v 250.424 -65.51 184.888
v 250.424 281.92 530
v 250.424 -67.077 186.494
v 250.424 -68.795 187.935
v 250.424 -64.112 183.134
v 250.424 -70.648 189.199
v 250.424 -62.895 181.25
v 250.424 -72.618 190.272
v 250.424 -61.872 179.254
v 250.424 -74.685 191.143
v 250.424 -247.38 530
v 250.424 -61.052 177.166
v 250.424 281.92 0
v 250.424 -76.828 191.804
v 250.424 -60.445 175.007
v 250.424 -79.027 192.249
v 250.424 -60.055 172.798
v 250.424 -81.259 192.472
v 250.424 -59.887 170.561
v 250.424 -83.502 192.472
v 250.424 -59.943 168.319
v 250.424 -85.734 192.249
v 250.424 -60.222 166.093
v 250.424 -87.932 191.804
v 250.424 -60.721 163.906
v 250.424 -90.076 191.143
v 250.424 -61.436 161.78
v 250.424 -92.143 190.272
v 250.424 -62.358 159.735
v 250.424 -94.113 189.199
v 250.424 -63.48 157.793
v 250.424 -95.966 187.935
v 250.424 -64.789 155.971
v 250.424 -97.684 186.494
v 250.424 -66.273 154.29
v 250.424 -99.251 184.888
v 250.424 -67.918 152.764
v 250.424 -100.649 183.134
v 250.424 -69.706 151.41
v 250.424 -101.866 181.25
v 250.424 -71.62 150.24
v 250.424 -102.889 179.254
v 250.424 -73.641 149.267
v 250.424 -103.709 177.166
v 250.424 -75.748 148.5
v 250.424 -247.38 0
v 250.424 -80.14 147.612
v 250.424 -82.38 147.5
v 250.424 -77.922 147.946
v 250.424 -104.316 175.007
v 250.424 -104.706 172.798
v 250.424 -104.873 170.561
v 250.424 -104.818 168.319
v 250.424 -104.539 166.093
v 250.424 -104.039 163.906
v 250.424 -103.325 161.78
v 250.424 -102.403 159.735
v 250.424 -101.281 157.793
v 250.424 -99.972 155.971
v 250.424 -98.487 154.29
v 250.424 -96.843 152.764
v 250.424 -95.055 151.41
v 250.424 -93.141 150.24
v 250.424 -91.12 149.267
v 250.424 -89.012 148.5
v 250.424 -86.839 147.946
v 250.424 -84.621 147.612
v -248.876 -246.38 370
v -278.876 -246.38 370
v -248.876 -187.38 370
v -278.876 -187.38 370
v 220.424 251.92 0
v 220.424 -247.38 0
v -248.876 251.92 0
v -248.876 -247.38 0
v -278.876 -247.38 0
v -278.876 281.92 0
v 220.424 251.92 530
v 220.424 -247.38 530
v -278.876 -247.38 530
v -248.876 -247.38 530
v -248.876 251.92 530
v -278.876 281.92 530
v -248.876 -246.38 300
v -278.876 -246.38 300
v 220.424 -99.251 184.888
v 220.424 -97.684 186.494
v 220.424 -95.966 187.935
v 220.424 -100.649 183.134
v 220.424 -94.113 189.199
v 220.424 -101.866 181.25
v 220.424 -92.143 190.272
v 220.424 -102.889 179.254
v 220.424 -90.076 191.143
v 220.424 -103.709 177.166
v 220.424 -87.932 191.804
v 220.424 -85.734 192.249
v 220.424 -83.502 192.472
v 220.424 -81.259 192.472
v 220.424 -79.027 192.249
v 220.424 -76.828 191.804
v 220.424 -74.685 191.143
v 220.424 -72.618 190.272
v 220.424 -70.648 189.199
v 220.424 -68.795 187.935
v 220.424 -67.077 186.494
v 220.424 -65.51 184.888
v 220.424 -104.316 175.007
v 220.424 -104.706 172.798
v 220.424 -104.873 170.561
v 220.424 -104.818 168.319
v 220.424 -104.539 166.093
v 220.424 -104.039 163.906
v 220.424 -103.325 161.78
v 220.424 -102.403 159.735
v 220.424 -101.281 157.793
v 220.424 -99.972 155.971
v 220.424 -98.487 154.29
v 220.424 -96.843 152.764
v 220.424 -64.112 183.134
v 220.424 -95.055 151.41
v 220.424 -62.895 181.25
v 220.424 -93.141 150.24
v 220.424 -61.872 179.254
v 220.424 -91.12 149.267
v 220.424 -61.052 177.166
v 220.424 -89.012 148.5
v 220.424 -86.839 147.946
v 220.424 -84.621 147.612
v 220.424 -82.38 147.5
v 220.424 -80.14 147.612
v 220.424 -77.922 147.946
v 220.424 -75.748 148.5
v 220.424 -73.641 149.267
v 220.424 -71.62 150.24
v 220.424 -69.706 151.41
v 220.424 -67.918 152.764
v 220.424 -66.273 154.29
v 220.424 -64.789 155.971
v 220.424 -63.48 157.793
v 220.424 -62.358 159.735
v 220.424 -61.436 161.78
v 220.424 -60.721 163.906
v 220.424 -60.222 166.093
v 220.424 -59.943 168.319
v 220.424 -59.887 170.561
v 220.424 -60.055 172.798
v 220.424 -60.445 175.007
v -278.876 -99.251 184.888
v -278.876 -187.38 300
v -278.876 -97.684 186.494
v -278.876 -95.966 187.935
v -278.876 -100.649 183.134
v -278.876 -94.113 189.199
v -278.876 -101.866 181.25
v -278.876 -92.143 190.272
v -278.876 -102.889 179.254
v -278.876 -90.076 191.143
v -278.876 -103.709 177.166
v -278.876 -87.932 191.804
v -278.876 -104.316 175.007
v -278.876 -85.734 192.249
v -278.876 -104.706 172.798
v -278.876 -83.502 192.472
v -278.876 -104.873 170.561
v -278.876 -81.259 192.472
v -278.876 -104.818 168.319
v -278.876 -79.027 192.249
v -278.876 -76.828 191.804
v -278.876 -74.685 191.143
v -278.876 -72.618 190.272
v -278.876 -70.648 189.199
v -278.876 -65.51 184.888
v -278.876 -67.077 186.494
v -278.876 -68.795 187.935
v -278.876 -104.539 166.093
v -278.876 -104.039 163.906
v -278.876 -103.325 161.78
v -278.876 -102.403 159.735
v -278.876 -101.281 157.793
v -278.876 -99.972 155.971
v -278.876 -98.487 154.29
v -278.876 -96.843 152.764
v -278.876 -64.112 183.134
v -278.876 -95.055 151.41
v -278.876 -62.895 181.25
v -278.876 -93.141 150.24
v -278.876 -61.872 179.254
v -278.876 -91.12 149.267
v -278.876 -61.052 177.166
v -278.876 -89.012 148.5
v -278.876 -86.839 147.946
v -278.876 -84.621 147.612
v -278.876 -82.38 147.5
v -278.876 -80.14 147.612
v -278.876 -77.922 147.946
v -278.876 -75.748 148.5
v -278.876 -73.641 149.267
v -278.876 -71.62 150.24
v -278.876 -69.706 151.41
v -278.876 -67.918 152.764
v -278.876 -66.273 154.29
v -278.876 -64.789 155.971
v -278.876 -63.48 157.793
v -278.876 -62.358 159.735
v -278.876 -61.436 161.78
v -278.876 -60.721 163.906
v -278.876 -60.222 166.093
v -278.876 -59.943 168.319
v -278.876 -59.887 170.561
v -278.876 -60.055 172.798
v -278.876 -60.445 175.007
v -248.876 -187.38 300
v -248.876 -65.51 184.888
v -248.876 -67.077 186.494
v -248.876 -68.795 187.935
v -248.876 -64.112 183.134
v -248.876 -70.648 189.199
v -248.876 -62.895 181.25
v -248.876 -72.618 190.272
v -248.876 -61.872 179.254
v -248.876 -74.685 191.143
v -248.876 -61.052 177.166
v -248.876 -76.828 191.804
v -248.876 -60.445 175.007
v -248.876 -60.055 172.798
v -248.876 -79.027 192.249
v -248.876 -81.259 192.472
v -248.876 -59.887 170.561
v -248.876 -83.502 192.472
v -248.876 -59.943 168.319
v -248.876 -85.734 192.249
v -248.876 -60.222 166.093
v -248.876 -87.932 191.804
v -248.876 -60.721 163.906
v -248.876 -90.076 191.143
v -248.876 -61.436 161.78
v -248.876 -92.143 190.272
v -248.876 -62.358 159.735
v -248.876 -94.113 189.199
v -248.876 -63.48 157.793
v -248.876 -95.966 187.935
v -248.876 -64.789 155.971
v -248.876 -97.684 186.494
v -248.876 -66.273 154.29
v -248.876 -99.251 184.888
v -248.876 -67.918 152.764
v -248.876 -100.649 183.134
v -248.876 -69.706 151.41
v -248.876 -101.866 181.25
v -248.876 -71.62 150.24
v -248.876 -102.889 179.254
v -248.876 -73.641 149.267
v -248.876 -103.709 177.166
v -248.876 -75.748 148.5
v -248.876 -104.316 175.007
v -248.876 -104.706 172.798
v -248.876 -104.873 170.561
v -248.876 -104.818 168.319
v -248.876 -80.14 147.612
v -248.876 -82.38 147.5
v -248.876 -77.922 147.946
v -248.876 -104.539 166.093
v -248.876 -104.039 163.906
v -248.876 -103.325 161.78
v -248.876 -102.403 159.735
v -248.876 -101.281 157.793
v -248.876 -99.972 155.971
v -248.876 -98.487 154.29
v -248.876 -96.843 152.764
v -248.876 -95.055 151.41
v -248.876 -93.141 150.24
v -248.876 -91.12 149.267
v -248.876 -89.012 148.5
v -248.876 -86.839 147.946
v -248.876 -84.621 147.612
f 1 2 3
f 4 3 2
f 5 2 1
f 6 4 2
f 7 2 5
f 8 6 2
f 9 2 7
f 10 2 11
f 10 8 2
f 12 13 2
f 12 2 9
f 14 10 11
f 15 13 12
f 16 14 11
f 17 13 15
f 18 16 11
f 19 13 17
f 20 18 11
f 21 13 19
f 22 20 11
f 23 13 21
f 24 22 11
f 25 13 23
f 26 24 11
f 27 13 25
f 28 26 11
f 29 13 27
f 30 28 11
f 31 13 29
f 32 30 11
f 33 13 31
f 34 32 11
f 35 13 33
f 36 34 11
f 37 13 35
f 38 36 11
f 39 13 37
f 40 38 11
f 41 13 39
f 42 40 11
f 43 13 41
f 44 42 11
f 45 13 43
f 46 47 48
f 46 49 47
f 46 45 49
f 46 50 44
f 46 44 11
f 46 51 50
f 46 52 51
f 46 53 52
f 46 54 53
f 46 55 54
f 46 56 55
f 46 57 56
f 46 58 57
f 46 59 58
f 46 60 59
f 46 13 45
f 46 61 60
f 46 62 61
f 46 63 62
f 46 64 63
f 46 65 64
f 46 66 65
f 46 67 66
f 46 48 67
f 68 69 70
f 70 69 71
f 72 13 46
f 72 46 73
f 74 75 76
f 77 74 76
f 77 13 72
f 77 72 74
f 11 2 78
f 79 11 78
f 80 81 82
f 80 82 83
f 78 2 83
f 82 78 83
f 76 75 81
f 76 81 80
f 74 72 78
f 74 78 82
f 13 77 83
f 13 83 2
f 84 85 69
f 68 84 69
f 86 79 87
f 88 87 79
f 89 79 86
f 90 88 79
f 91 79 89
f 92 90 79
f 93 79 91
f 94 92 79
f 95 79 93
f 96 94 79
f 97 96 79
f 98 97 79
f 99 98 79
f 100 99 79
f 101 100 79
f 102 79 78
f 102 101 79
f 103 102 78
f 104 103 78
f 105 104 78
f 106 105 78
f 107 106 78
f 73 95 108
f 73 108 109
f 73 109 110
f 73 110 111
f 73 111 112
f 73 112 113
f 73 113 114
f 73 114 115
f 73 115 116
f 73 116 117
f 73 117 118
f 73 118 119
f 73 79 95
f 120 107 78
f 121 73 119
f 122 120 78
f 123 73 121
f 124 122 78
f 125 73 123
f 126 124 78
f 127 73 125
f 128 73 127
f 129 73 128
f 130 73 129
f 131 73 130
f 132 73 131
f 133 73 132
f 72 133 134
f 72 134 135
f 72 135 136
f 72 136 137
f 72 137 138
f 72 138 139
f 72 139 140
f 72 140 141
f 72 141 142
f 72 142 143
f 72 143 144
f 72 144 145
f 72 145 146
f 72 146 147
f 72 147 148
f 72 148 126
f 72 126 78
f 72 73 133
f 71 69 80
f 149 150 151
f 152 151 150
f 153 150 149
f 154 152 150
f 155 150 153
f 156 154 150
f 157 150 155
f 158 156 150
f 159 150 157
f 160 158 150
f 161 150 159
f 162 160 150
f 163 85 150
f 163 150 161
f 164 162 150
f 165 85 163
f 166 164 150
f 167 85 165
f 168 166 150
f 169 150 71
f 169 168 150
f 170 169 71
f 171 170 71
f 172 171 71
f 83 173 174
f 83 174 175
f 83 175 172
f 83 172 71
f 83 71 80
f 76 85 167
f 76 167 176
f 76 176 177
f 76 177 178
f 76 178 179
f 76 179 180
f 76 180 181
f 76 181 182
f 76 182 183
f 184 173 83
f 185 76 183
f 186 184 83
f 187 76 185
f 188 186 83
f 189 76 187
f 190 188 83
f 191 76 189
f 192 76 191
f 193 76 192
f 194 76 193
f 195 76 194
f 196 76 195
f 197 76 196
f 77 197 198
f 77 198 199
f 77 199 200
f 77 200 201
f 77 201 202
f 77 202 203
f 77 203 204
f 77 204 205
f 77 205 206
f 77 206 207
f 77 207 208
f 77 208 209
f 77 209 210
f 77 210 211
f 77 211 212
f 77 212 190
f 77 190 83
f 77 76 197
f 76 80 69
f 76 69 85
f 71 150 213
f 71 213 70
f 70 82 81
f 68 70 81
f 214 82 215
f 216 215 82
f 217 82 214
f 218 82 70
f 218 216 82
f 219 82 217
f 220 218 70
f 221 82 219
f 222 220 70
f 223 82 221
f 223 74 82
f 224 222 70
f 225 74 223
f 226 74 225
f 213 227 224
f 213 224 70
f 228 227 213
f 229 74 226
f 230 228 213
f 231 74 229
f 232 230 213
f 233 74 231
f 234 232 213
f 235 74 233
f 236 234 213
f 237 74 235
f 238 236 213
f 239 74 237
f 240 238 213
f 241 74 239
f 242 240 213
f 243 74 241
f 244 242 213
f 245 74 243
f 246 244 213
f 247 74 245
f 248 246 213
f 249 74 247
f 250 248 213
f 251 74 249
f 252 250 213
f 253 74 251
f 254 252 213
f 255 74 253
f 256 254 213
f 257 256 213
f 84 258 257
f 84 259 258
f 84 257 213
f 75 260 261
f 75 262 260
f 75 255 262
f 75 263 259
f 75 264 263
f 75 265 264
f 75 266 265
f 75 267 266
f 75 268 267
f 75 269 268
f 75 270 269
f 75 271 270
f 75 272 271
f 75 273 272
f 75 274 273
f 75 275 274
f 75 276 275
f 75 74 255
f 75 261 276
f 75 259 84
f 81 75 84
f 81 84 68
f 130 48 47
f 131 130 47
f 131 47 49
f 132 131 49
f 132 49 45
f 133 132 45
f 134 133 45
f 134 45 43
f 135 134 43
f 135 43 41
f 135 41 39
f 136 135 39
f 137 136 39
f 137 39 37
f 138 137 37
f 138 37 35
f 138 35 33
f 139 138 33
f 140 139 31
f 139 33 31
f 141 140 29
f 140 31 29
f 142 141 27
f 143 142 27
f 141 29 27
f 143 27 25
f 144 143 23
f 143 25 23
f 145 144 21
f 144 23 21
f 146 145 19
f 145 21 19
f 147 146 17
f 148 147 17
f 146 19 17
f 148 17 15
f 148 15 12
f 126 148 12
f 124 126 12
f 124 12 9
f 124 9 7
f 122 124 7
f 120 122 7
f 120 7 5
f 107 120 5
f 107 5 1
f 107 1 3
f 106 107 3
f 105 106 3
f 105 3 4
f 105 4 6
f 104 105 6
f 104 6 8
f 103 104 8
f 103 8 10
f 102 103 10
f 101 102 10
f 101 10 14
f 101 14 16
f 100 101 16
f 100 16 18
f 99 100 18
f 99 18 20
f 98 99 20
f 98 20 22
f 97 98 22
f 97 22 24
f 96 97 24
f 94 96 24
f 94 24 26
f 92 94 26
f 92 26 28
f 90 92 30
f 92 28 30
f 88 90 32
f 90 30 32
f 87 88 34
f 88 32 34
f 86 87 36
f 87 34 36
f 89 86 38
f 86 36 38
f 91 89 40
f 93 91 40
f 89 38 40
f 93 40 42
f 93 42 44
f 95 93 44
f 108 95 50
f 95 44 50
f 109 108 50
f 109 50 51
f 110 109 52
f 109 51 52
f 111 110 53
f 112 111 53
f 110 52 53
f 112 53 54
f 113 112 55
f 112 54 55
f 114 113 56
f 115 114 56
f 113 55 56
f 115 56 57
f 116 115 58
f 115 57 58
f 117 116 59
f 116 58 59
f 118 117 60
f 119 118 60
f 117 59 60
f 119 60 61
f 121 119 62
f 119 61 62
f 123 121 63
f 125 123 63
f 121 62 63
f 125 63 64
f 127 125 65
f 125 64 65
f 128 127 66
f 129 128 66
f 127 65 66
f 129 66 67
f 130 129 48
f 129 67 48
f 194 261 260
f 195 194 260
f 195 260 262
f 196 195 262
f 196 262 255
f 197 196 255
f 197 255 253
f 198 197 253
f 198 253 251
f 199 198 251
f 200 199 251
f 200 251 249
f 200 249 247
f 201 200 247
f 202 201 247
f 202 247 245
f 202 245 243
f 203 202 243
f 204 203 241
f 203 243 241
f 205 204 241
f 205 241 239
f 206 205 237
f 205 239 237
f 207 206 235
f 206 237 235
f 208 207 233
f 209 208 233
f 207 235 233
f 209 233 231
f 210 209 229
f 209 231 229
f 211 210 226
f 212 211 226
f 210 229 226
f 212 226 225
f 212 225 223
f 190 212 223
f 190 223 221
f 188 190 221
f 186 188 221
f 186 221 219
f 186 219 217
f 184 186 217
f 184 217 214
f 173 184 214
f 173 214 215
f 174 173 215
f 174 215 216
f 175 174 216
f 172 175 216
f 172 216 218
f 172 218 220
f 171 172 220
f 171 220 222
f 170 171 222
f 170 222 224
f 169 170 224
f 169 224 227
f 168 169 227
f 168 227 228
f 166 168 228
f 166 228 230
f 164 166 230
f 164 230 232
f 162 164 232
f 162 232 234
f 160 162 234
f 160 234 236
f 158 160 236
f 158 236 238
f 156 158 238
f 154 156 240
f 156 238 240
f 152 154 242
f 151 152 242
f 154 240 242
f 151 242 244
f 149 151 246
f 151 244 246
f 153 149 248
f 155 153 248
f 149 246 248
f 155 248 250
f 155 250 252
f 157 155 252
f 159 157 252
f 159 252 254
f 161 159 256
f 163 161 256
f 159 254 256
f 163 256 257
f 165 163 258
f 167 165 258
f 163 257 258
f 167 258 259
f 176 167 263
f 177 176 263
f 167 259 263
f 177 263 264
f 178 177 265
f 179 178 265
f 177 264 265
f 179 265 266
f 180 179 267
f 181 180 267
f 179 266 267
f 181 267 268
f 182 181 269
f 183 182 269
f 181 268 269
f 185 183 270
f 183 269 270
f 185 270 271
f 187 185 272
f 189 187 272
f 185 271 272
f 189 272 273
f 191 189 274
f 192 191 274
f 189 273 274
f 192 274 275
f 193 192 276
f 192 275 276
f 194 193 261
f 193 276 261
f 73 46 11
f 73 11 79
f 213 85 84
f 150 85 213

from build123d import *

# Parameters (mm, degrees)
BOSS_EXTRUDE1_DEPTH     = 530
SKETCH2_R               = 22.5
CUT_EXTRUDE1_DEPTH      = 1
CUT_EXTRUDE1_DEPTH_BACK = 530.3
SKETCH3_W               = 70
SKETCH3_H               = 59
CUT_EXTRUDE2_DEPTH      = 220


with BuildPart() as part:
    # Sketch1 → Boss-Extrude1 (new body)
    with BuildSketch(Plane.XY):
        Polygon((-248.875659786, -247.380437864), (-278.875659786, -247.380437864), (-278.875659786, 281.919562136), (250.424340214, 281.919562136), (250.424340214, -247.380437864), (220.424340214, -247.380437864), (220.424340214, 251.919562136), (-248.875659786, 251.919562136), align=None)
    extrude(amount=BOSS_EXTRUDE1_DEPTH)

    # Sketch2 → Cut-Extrude1 (cut, two sides)
    with BuildSketch(Plane(origin=(250.424340214, 0, 0), x_dir=(0, 0, -1), z_dir=(1, 0, 0))) as cut_extrude1_sk:
        with Locations((-170, -82.380437864)):
            Circle(SKETCH2_R)
    extrude(amount=CUT_EXTRUDE1_DEPTH, mode=Mode.SUBTRACT)
    extrude(cut_extrude1_sk.sketch, amount=-CUT_EXTRUDE1_DEPTH_BACK, mode=Mode.SUBTRACT)

    # Sketch3 → Cut-Extrude2 (cut)
    with BuildSketch(Plane.ZY.offset(278.875659786)):
        with Locations((335, -216.880437864)):
            Rectangle(SKETCH3_W, SKETCH3_H)
    extrude(amount=-CUT_EXTRUDE2_DEPTH, mode=Mode.SUBTRACT)


solid = part.part
